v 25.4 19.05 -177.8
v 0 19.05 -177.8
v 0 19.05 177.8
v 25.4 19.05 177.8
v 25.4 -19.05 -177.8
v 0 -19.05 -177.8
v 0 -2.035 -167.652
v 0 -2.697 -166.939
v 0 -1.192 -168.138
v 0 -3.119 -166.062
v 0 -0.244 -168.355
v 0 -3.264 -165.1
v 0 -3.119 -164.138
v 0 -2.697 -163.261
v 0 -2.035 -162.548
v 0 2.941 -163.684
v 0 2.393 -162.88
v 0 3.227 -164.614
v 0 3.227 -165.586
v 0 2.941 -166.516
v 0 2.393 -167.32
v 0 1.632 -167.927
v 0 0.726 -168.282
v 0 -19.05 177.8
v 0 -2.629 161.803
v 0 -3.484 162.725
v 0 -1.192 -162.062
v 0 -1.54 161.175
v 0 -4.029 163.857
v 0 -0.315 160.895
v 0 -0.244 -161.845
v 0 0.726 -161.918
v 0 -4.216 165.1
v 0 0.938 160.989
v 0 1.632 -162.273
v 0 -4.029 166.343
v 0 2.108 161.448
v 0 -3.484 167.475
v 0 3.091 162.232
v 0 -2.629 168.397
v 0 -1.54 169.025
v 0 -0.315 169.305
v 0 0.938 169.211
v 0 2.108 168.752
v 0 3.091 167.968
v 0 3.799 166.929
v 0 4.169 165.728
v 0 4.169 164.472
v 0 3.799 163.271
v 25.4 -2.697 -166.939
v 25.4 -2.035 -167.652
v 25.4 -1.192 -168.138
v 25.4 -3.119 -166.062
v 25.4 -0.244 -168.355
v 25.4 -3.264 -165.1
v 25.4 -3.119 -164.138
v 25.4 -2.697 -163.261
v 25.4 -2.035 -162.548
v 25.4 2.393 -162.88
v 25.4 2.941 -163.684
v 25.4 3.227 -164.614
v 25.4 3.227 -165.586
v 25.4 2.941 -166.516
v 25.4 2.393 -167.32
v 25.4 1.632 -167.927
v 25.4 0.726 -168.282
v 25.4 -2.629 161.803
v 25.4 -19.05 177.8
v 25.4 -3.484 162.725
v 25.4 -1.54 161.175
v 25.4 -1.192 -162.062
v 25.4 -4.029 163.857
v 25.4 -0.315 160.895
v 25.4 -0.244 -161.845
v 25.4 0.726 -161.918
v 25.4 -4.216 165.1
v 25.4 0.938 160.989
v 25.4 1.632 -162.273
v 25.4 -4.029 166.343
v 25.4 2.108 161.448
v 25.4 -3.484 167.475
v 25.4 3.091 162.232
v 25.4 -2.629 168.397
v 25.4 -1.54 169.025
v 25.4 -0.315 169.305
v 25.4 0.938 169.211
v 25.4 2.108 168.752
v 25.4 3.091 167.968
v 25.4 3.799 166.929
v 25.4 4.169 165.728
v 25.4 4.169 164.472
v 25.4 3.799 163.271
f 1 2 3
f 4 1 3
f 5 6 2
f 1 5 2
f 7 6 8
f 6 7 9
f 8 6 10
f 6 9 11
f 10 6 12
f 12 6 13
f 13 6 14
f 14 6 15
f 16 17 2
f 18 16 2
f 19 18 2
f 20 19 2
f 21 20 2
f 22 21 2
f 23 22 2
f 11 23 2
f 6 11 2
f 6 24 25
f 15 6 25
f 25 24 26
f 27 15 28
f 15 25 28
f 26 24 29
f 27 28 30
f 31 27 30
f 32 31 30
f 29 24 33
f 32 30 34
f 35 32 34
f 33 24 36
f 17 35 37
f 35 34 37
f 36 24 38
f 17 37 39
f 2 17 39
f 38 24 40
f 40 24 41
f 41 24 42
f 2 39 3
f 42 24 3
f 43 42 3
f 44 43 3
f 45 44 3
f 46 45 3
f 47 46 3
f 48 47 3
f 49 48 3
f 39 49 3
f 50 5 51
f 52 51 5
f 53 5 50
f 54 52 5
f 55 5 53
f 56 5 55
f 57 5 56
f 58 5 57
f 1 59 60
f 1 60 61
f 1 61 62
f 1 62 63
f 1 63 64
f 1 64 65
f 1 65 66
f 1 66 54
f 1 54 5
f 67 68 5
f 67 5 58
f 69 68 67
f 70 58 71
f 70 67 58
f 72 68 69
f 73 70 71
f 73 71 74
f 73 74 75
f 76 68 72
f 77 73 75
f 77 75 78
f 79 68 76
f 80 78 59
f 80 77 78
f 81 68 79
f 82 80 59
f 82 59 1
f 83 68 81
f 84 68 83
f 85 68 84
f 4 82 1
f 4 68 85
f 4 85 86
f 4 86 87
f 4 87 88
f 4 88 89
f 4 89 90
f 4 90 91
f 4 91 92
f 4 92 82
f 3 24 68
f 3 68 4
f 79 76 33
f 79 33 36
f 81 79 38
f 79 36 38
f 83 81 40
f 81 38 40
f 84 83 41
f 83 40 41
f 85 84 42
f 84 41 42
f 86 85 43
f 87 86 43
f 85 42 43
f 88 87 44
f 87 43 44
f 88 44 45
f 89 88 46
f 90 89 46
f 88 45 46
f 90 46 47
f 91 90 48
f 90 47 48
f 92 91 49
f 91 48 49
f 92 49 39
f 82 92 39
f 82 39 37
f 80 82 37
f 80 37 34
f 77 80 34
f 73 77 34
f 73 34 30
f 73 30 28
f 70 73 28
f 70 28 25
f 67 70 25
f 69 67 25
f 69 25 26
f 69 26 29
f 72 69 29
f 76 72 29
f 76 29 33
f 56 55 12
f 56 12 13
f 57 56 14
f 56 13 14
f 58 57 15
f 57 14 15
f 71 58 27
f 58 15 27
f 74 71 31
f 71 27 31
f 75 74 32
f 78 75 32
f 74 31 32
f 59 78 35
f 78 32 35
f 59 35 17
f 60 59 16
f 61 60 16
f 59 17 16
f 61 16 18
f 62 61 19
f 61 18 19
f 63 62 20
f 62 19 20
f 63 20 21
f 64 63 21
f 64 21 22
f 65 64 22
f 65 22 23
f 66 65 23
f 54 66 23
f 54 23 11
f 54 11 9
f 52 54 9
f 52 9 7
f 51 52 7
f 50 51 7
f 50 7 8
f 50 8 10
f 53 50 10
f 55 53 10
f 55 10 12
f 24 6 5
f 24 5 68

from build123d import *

# Parameters (mm, degrees)
F0_W     = 38.1
F0_H     = 355.6
F1_DEPTH = 25.4
F3_D     = 6.5278
F5_D     = 8.4328


with BuildPart() as f1:
    # F0 (on Right) → F1 (new body)
    with BuildSketch(Plane.YZ):
        Rectangle(F0_W, F0_H)
    extrude(amount=F1_DEPTH)

    # F3 (through all)
    with Locations(Plane.YZ.offset(25.4)):
        with Locations((0, -165.1)):
            Hole(F3_D / 2)

    # F5 (through all)
    with Locations(Plane.YZ.offset(25.4)):
        with Locations((0, 165.1)):
            Hole(F5_D / 2)


solid = f1.part
